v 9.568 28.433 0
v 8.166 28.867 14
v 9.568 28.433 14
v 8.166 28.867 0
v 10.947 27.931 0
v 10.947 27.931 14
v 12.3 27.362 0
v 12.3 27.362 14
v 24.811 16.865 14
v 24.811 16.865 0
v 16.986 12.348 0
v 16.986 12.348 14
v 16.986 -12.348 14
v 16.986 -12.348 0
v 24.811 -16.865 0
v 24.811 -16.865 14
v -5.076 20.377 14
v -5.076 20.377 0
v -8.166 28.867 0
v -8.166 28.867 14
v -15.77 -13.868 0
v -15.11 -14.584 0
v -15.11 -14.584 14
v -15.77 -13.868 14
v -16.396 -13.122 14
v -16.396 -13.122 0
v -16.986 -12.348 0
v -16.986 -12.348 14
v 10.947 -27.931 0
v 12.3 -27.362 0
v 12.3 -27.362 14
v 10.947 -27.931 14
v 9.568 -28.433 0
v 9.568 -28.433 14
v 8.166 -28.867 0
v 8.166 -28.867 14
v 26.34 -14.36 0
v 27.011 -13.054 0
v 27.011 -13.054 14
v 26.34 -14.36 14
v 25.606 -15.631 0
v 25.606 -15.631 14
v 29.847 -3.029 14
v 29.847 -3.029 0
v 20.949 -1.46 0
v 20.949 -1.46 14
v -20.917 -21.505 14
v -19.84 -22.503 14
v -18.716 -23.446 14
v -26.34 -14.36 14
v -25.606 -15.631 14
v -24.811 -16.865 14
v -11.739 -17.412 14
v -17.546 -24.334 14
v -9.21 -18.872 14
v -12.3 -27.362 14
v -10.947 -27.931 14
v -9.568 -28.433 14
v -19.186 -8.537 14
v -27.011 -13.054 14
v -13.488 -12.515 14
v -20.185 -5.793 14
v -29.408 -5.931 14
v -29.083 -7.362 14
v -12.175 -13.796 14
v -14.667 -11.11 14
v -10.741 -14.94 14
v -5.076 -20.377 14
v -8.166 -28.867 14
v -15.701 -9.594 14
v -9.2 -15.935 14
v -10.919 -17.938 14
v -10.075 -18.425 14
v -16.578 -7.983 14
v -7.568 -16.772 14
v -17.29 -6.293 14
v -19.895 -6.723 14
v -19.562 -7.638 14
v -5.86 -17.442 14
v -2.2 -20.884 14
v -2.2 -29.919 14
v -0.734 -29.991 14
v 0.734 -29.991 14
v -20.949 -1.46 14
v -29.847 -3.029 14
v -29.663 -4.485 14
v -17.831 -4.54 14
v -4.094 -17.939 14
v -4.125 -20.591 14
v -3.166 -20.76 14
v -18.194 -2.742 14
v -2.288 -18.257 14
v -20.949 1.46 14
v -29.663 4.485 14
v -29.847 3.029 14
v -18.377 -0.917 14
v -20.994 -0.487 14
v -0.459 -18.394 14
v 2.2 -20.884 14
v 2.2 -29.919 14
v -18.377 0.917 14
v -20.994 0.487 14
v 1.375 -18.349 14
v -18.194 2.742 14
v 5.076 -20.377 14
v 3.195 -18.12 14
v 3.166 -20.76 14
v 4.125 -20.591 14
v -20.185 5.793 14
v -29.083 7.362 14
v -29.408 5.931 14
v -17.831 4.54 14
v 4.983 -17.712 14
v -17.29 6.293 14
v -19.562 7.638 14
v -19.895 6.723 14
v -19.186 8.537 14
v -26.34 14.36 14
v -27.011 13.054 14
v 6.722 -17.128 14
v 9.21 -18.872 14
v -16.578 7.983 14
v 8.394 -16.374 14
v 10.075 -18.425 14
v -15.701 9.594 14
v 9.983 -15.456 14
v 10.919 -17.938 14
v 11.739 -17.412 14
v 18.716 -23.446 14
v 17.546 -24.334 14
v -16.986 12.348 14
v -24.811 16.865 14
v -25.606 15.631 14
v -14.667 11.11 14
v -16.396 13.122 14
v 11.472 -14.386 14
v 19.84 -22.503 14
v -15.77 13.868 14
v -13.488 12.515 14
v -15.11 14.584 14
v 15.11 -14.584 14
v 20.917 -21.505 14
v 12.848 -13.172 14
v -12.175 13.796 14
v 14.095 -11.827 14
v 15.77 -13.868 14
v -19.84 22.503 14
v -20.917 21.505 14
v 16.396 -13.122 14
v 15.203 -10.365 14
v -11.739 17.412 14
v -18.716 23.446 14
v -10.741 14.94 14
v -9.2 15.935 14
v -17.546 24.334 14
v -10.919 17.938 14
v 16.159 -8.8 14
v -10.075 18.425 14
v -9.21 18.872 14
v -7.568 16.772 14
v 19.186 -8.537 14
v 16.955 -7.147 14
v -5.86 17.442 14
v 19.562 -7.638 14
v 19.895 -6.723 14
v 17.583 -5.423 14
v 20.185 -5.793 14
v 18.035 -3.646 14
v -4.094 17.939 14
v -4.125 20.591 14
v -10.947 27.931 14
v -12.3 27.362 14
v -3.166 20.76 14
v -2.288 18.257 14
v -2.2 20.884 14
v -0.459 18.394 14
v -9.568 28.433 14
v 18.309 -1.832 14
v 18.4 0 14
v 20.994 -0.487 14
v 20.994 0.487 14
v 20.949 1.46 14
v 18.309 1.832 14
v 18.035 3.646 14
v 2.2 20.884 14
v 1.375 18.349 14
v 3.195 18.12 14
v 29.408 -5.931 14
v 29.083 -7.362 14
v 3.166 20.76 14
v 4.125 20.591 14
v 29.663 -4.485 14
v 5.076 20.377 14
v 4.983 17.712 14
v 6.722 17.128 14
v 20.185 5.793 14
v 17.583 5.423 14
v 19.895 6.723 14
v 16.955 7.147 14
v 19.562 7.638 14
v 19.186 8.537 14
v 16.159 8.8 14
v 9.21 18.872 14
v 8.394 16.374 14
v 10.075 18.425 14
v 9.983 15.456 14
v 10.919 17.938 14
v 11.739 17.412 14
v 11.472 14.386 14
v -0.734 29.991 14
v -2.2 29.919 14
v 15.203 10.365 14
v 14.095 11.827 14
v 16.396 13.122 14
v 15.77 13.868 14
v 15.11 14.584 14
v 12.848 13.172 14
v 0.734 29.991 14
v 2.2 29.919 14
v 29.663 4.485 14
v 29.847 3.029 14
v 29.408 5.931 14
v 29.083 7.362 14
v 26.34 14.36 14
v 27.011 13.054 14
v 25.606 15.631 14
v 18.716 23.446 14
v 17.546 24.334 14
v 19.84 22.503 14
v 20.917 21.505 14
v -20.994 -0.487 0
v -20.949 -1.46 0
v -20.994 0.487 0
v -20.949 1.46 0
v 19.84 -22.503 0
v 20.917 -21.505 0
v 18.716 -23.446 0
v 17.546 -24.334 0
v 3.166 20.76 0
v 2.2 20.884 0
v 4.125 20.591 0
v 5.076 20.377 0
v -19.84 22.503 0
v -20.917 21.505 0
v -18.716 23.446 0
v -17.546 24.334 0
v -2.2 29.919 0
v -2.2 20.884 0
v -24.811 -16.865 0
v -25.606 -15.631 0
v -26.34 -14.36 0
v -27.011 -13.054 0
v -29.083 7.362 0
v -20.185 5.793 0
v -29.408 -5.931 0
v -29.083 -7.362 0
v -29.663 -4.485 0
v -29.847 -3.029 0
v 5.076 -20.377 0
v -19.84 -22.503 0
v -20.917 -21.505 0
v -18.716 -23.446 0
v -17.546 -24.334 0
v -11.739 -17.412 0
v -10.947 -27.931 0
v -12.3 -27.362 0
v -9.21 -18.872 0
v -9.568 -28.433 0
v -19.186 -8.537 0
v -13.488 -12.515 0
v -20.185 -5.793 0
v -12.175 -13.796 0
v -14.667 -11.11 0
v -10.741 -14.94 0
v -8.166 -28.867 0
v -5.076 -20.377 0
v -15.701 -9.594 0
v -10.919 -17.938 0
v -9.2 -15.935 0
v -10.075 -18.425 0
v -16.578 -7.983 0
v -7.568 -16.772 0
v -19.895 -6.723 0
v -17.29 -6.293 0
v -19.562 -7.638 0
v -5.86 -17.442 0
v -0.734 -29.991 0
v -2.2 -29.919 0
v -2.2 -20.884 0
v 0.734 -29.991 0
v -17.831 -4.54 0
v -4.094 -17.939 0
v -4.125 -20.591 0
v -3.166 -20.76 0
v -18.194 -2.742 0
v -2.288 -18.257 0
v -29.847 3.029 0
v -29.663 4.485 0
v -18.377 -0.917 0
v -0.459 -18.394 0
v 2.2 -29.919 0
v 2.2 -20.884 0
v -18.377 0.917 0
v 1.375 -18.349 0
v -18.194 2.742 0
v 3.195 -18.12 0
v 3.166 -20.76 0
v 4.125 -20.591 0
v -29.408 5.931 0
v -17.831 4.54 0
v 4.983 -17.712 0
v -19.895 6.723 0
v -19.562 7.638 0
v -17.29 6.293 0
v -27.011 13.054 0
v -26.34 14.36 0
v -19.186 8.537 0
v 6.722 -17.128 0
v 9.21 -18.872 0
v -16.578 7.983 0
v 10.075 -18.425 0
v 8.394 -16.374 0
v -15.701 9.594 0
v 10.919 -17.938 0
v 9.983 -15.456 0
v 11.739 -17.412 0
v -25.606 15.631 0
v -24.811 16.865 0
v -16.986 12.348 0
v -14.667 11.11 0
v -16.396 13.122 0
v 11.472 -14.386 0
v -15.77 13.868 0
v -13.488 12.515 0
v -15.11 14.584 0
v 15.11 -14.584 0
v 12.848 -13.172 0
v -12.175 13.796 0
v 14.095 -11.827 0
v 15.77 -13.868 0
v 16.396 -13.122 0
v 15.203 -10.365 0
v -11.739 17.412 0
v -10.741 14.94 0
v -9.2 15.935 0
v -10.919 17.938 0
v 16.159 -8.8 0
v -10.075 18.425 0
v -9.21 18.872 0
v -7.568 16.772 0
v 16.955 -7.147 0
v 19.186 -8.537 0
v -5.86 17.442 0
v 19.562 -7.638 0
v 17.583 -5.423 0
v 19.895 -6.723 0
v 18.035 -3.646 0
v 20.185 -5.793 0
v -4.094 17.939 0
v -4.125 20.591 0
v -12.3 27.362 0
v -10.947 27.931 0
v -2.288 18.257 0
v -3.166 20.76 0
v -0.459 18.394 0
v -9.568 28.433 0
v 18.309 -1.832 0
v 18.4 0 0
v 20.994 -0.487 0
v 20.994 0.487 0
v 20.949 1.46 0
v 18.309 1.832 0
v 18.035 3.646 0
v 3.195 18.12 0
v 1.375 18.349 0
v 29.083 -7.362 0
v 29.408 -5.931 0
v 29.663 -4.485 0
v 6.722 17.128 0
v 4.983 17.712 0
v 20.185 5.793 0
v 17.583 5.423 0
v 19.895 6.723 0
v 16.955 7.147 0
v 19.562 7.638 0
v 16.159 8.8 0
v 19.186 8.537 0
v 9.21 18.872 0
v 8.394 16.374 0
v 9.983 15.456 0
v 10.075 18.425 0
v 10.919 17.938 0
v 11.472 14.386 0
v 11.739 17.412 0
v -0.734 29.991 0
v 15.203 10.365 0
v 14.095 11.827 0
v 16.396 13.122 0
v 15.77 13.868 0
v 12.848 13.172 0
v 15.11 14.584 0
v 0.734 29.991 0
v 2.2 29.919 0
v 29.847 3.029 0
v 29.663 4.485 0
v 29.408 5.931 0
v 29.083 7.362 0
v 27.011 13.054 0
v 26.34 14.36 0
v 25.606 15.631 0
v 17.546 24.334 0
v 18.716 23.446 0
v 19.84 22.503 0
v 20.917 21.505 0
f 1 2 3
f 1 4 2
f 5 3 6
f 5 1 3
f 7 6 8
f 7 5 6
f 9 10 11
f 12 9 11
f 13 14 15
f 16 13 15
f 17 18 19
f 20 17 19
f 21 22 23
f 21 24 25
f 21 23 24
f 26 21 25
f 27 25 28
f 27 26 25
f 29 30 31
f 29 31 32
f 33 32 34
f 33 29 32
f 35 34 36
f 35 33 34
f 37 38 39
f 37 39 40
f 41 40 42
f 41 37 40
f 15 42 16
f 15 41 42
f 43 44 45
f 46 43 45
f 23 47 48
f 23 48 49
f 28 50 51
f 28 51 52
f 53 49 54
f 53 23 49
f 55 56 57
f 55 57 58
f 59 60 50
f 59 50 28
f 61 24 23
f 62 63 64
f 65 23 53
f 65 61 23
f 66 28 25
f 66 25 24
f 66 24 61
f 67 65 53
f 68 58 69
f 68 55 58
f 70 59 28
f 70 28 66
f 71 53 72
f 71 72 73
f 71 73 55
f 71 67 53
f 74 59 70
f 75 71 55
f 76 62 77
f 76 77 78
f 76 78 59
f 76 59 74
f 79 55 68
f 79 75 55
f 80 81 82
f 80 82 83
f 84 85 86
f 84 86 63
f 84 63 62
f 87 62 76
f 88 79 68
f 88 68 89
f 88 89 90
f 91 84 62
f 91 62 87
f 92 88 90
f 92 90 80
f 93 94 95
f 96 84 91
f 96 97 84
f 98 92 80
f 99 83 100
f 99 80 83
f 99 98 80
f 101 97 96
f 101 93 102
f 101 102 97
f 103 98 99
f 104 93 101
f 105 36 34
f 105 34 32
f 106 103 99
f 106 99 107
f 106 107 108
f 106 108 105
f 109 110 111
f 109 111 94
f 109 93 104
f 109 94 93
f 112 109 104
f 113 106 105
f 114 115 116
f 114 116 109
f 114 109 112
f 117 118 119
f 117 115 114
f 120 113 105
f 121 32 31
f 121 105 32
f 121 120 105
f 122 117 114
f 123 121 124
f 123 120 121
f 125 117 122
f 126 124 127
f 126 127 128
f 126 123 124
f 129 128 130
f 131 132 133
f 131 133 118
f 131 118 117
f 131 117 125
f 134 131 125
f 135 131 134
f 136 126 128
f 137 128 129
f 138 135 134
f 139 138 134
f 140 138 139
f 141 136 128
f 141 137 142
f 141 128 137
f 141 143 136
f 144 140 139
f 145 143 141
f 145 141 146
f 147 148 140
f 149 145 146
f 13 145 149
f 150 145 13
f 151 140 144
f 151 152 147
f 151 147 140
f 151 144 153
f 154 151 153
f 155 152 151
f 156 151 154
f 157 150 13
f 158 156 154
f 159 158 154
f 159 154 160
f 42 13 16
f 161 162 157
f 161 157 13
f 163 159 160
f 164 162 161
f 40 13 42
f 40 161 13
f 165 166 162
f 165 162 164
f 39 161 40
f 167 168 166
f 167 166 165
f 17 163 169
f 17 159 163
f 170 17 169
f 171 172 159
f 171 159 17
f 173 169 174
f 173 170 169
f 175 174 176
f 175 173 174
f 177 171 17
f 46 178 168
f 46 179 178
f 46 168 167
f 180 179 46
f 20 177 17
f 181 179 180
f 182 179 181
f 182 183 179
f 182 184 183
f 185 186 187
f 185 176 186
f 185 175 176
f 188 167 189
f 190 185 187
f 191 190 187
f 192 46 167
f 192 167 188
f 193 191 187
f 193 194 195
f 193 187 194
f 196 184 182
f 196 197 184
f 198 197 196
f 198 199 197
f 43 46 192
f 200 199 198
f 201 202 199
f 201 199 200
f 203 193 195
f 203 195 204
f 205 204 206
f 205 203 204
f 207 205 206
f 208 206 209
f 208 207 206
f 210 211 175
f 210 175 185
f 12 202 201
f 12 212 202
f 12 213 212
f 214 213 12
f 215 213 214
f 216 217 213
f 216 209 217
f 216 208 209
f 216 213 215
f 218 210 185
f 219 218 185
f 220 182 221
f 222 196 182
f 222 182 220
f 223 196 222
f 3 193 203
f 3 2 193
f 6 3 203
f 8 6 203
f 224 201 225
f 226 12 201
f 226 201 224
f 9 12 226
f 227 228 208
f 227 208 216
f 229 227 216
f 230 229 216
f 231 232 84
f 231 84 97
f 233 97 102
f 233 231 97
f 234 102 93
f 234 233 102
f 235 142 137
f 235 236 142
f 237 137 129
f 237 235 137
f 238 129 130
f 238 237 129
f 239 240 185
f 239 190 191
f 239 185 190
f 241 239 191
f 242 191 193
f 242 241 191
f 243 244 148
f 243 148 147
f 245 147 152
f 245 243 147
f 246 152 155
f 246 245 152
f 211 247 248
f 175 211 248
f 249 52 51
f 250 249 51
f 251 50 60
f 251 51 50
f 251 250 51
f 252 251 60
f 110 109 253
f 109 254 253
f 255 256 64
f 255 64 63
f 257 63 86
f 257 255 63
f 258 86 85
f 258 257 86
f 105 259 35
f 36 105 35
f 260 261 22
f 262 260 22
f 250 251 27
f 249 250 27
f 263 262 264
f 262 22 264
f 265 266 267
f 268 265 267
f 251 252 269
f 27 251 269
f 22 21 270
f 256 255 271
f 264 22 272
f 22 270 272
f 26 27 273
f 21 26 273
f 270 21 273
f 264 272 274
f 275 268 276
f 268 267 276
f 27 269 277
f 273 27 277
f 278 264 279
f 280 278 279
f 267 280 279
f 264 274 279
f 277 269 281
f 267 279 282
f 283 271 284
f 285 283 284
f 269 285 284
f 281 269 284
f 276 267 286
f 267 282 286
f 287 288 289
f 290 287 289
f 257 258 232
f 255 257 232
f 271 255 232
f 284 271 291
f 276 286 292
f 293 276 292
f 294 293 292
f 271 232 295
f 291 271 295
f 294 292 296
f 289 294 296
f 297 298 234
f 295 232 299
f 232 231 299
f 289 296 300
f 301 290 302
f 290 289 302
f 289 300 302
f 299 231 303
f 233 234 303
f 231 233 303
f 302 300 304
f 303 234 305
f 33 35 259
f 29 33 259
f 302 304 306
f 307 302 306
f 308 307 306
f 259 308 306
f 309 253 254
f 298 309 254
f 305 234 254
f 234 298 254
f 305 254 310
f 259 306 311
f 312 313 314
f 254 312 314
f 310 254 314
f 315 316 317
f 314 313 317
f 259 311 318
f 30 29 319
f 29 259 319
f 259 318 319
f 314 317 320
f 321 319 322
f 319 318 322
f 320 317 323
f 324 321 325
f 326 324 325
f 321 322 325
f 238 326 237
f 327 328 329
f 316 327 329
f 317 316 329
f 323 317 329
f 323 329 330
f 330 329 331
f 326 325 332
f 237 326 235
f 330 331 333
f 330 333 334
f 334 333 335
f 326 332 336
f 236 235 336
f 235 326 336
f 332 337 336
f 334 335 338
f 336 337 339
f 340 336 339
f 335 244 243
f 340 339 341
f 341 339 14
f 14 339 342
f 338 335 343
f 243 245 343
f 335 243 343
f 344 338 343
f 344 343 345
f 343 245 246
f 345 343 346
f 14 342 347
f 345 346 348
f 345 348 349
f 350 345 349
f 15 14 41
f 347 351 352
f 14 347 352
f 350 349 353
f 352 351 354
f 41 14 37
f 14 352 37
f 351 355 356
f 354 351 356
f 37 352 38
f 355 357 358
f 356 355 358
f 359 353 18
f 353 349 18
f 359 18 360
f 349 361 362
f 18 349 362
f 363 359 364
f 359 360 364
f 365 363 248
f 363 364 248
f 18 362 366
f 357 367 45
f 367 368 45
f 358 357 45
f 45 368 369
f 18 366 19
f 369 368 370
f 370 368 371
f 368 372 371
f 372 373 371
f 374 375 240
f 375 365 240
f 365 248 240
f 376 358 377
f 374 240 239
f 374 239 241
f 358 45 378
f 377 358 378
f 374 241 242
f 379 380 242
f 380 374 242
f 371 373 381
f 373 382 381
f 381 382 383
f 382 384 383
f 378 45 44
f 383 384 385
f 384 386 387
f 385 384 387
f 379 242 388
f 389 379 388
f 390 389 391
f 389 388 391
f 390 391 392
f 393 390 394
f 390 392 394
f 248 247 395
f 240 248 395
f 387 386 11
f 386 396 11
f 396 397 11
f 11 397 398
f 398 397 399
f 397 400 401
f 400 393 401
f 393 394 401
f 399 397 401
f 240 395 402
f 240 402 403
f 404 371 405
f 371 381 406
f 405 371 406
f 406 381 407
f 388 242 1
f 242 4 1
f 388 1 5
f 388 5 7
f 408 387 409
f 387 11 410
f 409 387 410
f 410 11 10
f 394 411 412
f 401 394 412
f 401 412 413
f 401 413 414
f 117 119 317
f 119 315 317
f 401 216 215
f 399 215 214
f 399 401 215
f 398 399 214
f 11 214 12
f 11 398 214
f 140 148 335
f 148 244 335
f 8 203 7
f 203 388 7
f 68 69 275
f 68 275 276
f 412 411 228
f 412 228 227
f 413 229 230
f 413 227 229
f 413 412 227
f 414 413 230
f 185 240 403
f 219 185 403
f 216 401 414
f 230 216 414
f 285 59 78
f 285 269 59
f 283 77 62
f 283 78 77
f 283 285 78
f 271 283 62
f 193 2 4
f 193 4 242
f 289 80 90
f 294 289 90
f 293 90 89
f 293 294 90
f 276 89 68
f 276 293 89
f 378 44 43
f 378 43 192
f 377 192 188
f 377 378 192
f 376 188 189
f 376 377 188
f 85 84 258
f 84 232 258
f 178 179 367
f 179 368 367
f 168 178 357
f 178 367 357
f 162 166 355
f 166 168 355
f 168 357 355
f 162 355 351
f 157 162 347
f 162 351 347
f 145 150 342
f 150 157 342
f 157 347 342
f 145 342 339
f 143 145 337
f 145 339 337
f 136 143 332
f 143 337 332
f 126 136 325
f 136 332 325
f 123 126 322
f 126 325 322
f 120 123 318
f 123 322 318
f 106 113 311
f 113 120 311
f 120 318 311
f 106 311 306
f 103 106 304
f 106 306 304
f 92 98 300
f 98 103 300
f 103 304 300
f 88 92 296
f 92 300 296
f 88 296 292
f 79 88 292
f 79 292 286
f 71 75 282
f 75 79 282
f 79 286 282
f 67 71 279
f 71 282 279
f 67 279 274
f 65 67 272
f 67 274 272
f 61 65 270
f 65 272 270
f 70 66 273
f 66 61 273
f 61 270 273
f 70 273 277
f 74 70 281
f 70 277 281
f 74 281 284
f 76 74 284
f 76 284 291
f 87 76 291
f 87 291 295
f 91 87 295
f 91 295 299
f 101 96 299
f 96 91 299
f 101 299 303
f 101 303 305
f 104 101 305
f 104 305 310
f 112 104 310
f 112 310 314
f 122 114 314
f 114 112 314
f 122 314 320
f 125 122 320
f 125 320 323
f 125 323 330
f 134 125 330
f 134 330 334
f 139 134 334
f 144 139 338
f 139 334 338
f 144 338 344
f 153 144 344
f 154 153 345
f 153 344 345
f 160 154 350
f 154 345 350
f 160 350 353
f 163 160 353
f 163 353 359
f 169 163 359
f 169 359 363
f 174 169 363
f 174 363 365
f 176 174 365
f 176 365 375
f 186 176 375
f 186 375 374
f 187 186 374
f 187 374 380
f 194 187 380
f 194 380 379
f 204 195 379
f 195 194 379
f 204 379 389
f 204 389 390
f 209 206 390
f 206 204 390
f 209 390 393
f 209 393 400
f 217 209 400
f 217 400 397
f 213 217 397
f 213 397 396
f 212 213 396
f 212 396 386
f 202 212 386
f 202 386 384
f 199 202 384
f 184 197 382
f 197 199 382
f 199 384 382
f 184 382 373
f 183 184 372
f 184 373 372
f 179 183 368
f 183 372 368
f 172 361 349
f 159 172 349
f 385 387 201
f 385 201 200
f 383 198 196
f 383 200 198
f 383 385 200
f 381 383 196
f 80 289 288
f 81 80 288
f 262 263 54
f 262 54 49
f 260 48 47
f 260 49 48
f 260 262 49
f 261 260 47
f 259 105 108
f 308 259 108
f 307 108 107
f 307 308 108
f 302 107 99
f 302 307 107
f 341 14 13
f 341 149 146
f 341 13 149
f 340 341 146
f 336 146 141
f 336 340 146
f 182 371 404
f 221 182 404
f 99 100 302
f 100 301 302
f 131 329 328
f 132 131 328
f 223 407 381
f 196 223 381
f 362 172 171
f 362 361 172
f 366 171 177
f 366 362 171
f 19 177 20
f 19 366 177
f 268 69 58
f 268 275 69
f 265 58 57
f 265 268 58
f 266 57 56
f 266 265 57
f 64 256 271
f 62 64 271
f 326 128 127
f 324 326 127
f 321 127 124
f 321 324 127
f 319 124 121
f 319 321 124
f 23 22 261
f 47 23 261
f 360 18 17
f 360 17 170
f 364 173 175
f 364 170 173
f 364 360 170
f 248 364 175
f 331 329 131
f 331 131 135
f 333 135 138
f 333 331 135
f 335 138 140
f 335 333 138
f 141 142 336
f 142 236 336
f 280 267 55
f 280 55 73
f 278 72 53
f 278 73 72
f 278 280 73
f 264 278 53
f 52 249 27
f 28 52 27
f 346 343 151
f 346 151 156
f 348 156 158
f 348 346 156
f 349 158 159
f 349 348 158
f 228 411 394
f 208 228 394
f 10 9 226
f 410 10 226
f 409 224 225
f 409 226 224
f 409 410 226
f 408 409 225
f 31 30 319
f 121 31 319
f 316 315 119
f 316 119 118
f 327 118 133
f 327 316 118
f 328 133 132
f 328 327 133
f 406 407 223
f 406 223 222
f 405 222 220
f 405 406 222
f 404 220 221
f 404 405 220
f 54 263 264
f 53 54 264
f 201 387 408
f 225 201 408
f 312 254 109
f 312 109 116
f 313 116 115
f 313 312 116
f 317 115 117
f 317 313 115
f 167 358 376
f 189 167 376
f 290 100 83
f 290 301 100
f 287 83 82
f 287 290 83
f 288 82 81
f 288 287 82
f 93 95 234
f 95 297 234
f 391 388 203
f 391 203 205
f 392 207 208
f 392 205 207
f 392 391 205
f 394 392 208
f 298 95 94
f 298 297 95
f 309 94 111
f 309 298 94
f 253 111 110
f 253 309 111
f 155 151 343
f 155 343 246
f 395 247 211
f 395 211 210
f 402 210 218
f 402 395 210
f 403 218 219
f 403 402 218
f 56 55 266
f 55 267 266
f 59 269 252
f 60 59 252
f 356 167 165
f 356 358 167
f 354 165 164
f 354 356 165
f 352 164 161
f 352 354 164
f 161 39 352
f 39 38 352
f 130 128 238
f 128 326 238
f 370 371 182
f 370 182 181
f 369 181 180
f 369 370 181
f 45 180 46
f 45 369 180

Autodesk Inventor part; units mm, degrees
ref_plane "YZ Plane" through (0, 0, 0) normal (1, 0, 0) x (0, 1, 0)
ref_plane "XZ Plane" through (0, 0, 0) normal (0, 1, 0) x (-1, 0, 0)
ref_plane "XY Plane" through (0, 0, 0) normal (0, 0, 1) x (1, 0, 0)
sketch "스케치1" plane through (0, 0, 0) normal (0, 0, 1) x (1, 0, 0)
  circle A0 centre (0, 0) radius 18.4
  arc A1 (2.2, 29.9192) -> (-2.2, 29.9192) centre (0, 0) ccw
  arc A2 (-2.2, 20.8844) -> (2.2, 20.8844) centre (0, 0) ccw
  line L0 (2.2, 29.9192) -> (-2.2, 29.9192)
  line L1 (-2.2, 29.9192) -> (-2.2, 20.8844)
  line L2 (2.2, 20.8844) -> (2.2, 29.9192)
  arc A3 (-8.1657, 28.8673) -> (-12.3003, 27.3624) centre (0, 0) ccw
  line L3 (-8.1657, 28.8673) -> (-12.3003, 27.3624)
  line L4 (-12.3003, 27.3624) -> (-9.2102, 18.8725)
  line L5 (-5.0756, 20.3774) -> (-8.1657, 28.8673)
  arc A4 (-17.5464, 24.3336) -> (-20.917, 21.5053) centre (0, 0) ccw
  line L6 (-17.5464, 24.3336) -> (-20.917, 21.5053)
  line L7 (-20.917, 21.5053) -> (-15.1096, 14.5843)
  line L8 (-11.739, 17.4125) -> (-17.5464, 24.3336)
  arc A5 (-24.8108, 16.8649) -> (-27.0108, 13.0544) centre (0, 0) ccw
  line L9 (-24.8108, 16.8649) -> (-27.0108, 13.0544)
  line L10 (-27.0108, 13.0544) -> (-19.1865, 8.537)
  line L11 (-16.9865, 12.3475) -> (-24.8108, 16.8649)
  arc A6 (-29.0827, 7.362) -> (-29.8467, 3.0288) centre (0, 0) ccw
  line L12 (-29.0827, 7.362) -> (-29.8467, 3.0288)
  line L13 (-29.8467, 3.0288) -> (-20.9492, 1.46)
  line L14 (-20.1851, 5.7931) -> (-29.0827, 7.362)
  arc A7 (-29.8467, -3.0288) -> (-29.0827, -7.362) centre (0, 0) ccw
  line L15 (-29.8467, -3.0288) -> (-29.0827, -7.362)
  line L16 (-29.0827, -7.362) -> (-20.1851, -5.7931)
  line L17 (-20.9492, -1.46) -> (-29.8467, -3.0288)
  arc A8 (-27.0108, -13.0544) -> (-24.8108, -16.8649) centre (0, 0) ccw
  line L18 (-27.0108, -13.0544) -> (-24.8108, -16.8649)
  line L19 (-24.8108, -16.8649) -> (-16.9865, -12.3475)
  line L20 (-19.1865, -8.537) -> (-27.0108, -13.0544)
  arc A9 (-20.917, -21.5053) -> (-17.5464, -24.3336) centre (0, 0) ccw
  line L21 (-20.917, -21.5053) -> (-17.5464, -24.3336)
  line L22 (-17.5464, -24.3336) -> (-11.739, -17.4125)
  line L23 (-15.1096, -14.5843) -> (-20.917, -21.5053)
  arc A10 (-12.3003, -27.3624) -> (-8.1657, -28.8673) centre (0, 0) ccw
  line L24 (-12.3003, -27.3624) -> (-8.1657, -28.8673)
  line L25 (-8.1657, -28.8673) -> (-5.0756, -20.3774)
  line L26 (-9.2102, -18.8725) -> (-12.3003, -27.3624)
  arc A11 (-2.2, -29.9192) -> (2.2, -29.9192) centre (0, 0) ccw
  line L27 (-2.2, -29.9192) -> (2.2, -29.9192)
  line L28 (2.2, -29.9192) -> (2.2, -20.8844)
  line L29 (-2.2, -20.8844) -> (-2.2, -29.9192)
  arc A12 (8.1657, -28.8673) -> (12.3003, -27.3624) centre (0, 0) ccw
  line L30 (8.1657, -28.8673) -> (12.3003, -27.3624)
  line L31 (12.3003, -27.3624) -> (9.2102, -18.8725)
  line L32 (5.0756, -20.3774) -> (8.1657, -28.8673)
  arc A13 (17.5464, -24.3336) -> (20.917, -21.5053) centre (0, 0) ccw
  line L33 (17.5464, -24.3336) -> (20.917, -21.5053)
  line L34 (20.917, -21.5053) -> (15.1096, -14.5843)
  line L35 (11.739, -17.4125) -> (17.5464, -24.3336)
  arc A14 (24.8108, -16.8649) -> (27.0108, -13.0544) centre (0, 0) ccw
  line L36 (24.8108, -16.8649) -> (27.0108, -13.0544)
  line L37 (27.0108, -13.0544) -> (19.1865, -8.537)
  line L38 (16.9865, -12.3475) -> (24.8108, -16.8649)
  arc A15 (29.0827, -7.362) -> (29.8467, -3.0288) centre (0, 0) ccw
  line L39 (29.0827, -7.362) -> (29.8467, -3.0288)
  line L40 (29.8467, -3.0288) -> (20.9492, -1.46)
  line L41 (20.1851, -5.7931) -> (29.0827, -7.362)
  arc A16 (29.8467, 3.0288) -> (29.0827, 7.362) centre (0, 0) ccw
  line L42 (29.8467, 3.0288) -> (29.0827, 7.362)
  line L43 (29.0827, 7.362) -> (20.1851, 5.7931)
  line L44 (20.9492, 1.46) -> (29.8467, 3.0288)
  arc A17 (27.0108, 13.0544) -> (24.8108, 16.8649) centre (0, 0) ccw
  line L45 (27.0108, 13.0544) -> (24.8108, 16.8649)
  line L46 (24.8108, 16.8649) -> (16.9865, 12.3475)
  line L47 (19.1865, 8.537) -> (27.0108, 13.0544)
  arc A18 (20.917, 21.5053) -> (17.5464, 24.3336) centre (0, 0) ccw
  line L48 (20.917, 21.5053) -> (17.5464, 24.3336)
  line L49 (17.5464, 24.3336) -> (11.739, 17.4125)
  line L50 (15.1096, 14.5843) -> (20.917, 21.5053)
  arc A19 (12.3003, 27.3624) -> (8.1657, 28.8673) centre (0, 0) ccw
  line L51 (12.3003, 27.3624) -> (8.1657, 28.8673)
  line L52 (8.1657, 28.8673) -> (5.0756, 20.3774)
  line L53 (9.2102, 18.8725) -> (12.3003, 27.3624)
  dimension "d6" = 360
extrude "돌출1" add sketch "스케치1" along normal blind 14
properties part number "Dummy_Stator"
